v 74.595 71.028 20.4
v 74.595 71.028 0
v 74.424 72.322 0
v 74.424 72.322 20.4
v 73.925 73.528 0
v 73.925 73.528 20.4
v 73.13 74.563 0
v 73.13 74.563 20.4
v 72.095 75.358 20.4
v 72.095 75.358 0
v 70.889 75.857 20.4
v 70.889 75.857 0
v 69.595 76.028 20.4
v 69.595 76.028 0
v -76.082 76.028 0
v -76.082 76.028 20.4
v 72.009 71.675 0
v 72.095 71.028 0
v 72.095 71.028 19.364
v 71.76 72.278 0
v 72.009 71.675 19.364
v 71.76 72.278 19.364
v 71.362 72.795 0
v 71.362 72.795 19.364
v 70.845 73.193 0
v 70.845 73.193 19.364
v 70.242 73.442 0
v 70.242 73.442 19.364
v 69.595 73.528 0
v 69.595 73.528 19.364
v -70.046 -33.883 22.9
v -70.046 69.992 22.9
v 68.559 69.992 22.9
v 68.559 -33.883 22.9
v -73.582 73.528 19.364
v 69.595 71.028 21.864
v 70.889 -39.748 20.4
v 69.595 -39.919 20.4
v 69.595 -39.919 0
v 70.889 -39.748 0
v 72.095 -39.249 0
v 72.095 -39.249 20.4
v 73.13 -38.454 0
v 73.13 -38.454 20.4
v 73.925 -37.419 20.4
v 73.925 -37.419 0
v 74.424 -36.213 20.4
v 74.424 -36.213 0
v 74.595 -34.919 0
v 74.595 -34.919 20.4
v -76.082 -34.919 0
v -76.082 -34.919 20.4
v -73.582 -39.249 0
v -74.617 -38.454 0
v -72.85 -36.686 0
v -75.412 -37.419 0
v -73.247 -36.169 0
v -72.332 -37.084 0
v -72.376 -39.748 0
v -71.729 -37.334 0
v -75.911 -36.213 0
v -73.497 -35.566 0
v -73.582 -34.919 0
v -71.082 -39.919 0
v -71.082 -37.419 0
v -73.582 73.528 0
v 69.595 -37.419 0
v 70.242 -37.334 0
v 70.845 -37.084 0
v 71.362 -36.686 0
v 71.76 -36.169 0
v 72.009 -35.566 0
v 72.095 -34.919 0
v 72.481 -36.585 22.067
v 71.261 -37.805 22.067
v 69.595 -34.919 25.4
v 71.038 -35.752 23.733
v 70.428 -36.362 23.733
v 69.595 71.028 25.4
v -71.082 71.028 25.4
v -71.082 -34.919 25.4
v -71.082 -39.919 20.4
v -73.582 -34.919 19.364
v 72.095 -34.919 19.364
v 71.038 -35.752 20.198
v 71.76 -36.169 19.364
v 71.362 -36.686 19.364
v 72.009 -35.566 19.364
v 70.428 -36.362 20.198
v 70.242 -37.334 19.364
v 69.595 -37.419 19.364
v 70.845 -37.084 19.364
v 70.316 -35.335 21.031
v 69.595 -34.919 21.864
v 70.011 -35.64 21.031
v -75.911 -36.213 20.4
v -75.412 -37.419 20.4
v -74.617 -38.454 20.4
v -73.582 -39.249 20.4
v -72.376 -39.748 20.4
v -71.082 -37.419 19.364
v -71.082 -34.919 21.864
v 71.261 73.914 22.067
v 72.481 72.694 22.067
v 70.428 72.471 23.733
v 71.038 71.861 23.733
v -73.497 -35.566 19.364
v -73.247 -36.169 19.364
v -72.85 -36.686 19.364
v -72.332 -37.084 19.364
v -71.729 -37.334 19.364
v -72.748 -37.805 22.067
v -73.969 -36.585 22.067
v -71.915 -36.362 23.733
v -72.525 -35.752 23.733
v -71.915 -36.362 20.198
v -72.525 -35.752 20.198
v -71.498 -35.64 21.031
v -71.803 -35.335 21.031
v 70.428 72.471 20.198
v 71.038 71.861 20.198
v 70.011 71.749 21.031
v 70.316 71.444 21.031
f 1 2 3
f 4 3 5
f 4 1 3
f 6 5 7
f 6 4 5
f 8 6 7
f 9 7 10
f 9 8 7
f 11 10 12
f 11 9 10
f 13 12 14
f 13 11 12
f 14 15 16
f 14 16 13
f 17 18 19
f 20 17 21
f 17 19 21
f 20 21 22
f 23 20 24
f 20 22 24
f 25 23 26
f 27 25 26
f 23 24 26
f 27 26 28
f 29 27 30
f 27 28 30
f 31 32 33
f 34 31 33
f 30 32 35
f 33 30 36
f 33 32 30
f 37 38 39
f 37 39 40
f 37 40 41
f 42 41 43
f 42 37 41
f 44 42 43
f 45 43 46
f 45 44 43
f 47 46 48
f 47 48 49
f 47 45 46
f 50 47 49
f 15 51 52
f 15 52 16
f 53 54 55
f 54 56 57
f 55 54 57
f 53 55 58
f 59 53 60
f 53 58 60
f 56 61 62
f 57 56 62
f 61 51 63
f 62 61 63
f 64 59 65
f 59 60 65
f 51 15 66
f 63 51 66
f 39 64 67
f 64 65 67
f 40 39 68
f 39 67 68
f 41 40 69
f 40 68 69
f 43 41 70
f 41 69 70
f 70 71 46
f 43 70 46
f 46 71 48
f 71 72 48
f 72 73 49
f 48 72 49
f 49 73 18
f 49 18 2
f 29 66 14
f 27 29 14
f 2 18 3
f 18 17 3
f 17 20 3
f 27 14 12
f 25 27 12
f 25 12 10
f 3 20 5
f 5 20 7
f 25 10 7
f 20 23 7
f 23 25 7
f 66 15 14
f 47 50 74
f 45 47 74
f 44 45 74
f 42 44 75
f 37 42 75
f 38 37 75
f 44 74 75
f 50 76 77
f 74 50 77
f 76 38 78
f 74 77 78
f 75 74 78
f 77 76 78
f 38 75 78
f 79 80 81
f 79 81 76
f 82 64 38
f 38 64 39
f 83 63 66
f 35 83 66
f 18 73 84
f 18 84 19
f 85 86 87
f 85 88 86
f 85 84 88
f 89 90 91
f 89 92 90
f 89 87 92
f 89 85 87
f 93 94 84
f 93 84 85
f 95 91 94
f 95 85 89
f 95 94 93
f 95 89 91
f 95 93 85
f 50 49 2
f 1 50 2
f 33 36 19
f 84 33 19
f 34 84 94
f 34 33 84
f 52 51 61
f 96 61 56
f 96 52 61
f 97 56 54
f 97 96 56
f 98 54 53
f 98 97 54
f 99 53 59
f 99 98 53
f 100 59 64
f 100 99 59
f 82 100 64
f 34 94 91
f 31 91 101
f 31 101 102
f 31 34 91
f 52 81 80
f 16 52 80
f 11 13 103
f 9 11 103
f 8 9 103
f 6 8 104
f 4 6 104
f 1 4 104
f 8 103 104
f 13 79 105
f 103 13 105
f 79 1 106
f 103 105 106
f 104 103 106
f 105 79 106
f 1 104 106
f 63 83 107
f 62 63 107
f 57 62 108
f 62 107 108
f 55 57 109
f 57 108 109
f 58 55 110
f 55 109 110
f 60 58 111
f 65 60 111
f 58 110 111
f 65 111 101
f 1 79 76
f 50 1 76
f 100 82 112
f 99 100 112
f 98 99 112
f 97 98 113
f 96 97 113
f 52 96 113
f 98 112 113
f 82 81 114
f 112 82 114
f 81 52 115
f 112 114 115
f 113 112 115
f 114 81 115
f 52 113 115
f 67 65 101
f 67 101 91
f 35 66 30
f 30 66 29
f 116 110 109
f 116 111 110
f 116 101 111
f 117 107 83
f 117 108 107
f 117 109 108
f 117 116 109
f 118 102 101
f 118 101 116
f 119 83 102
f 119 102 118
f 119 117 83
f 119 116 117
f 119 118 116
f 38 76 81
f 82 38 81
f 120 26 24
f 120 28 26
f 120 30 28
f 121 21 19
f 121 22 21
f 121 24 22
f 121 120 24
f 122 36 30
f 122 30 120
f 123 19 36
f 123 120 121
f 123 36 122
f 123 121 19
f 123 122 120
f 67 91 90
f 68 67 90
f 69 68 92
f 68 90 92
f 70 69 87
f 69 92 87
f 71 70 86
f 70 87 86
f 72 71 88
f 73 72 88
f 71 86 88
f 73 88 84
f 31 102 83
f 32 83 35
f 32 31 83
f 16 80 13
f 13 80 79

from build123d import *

# Parameters (mm, degrees)
F0_W     = 150.6762728095
F0_H     = 115.9463040531
F1_DEPTH = 25.4
F2_R     = 5
F3_SIZE  = 5
F4_T     = 2.5


# Not quite as in the source:
# - a shell that OpenCascade refuses in one call is made with other operations: the cavity is built on its own and cut out


with BuildPart() as f1:
    # F0 (on Top) → F1 (new body)
    with BuildSketch(Plane.XY):
        with Locations((-0.7436312735, 18.0544536561)):
            Rectangle(F0_W, F0_H)
    extrude(amount=F1_DEPTH)

    # F2
    f2_edges = [f1.edges().sort_by_distance(p)[0] for p in [
        (-76.081768, -39.918698, 12.7),
        (74.594505, -39.918698, 12.7),
        (74.594505, 76.027606, 12.7),
    ]]
    fillet(f2_edges, radius=F2_R)

    # F3
    f3_edges = [f1.edges().sort_by_distance(p)[0] for p in [
        (-76.081768, 20.554454, 25.4),
        (-74.617302, -38.454232, 25.4),
        (-3.243631, 76.027606, 25.4),
        (-0.743631, -39.918698, 25.4),
        (73.130039, 74.56314, 25.4),
        (73.130039, -38.454232, 25.4),
        (74.594505, 18.054454, 25.4),
    ]]
    chamfer(f3_edges, length=F3_SIZE)

    # F4: shell of thickness 2.5, made by hand


with BuildPart() as f4_core1:
    # F4_t2: copy of F1
    add(f1.part)

    # the walls: a layer under each face that stays
    f4_faces = [f4_core1.faces().sort_by_distance(p)[0] for p in [
        (-76.0817676783, 20.5544536561, 10.2),
        (-74.6173015842, -38.4542322764, 10.2),
        (-73.5817676783, 20.5544536561, 22.9),
        (-3.2436312735, 76.0276056826, 10.2),
        (-72.8495346312, -36.6864653234, 22.9),
        (-0.7436312735, -39.9186983705, 10.2),
        (-3.2436312735, 73.5276056826, 22.9),
        (-0.7436312735, 18.0544536561, 25.4),
        (73.1300390372, 74.5631395885, 10.2),
        (73.1300390372, -38.4542322764, 10.2),
        (74.5945051312, 18.0544536561, 10.2),
        (-0.7436312735, -37.4186983705, 22.9),
        (71.3622720842, 72.7953726356, 22.9),
        (72.0945051312, 18.0544536561, 22.9),
        (71.3622720842, -36.6864653234, 22.9),
    ]]
    thicken(f4_faces, amount=-F4_T, mode=Mode.SUBTRACT)


with BuildPart() as f1_1:
    add(f1.part)

    # what is left inside the walls is the cavity
    f4_cavity = [f4_core1.part.solids().sort_by_distance(p)[0] for p in [
        (-0.743631, -0.436597, 0.025),
    ]]
    add(f4_cavity, mode=Mode.SUBTRACT)


solid = f1_1.part
